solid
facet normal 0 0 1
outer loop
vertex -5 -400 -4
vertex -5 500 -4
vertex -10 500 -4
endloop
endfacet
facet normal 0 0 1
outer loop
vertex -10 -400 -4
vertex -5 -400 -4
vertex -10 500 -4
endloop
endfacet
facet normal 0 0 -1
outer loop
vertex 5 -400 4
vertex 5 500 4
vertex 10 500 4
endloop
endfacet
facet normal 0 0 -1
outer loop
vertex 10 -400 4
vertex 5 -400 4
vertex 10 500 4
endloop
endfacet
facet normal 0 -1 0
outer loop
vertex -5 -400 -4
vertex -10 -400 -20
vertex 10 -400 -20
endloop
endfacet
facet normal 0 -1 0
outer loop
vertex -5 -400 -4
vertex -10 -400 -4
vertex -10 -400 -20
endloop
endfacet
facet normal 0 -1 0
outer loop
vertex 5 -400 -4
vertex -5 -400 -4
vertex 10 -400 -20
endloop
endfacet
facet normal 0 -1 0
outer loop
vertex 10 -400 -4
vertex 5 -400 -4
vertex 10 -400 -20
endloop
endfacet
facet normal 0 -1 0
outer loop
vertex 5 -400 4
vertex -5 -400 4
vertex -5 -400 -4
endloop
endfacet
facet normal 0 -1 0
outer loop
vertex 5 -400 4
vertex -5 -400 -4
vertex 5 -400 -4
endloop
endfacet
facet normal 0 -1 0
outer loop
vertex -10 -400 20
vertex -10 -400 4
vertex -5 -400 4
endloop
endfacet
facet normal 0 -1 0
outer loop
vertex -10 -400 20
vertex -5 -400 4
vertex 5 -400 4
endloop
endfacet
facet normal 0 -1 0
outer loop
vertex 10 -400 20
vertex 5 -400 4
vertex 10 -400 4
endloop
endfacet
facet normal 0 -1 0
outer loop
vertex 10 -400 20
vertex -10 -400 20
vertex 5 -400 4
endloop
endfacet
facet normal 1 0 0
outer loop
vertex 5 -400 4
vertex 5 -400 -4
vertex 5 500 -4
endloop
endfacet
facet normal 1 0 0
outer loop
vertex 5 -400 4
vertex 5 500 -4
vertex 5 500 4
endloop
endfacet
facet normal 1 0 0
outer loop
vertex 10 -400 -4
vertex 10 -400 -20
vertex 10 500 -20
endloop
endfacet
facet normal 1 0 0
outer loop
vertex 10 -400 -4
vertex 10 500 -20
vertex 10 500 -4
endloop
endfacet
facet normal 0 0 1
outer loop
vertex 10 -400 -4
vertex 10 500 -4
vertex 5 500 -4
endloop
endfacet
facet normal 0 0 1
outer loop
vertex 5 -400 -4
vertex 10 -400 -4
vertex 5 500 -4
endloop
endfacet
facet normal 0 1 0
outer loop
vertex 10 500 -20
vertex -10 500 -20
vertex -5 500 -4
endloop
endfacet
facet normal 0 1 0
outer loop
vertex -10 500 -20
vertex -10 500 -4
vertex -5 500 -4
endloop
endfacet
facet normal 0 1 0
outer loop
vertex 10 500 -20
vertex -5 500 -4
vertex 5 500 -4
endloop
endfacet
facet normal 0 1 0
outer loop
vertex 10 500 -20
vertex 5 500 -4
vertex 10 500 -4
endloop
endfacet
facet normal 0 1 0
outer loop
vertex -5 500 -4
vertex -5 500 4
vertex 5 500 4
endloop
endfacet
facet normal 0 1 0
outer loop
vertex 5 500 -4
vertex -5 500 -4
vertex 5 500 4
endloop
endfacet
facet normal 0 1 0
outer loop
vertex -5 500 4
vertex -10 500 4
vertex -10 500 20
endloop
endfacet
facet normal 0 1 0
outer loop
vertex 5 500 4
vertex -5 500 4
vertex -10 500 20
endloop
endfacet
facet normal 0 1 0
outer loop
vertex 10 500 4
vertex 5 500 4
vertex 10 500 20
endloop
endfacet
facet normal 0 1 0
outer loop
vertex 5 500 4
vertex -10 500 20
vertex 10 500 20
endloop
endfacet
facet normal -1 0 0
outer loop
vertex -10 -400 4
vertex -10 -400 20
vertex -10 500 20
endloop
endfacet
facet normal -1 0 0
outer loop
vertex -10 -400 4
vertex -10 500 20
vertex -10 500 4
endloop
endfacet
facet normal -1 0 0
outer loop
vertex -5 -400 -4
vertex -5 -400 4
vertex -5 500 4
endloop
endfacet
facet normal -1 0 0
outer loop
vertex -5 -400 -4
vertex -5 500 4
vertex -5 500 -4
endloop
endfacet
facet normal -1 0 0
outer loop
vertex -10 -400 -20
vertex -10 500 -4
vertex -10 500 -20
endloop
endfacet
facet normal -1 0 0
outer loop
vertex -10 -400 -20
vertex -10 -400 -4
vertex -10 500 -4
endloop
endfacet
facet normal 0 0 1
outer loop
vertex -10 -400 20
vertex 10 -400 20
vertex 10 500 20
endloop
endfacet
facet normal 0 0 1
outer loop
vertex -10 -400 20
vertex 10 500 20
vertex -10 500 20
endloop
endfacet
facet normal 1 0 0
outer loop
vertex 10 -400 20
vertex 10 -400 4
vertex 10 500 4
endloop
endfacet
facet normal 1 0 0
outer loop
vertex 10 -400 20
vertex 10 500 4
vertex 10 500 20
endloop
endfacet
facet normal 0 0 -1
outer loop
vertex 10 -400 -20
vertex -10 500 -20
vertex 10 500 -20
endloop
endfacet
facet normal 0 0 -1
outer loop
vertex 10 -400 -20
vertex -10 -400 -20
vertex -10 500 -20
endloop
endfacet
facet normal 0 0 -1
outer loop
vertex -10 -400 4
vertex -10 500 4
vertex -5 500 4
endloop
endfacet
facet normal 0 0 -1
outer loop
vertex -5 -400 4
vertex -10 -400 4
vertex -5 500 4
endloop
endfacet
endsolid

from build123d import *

# Parameters (mm, degrees)
F1_DEPTH      = 400
F1_DEPTH_BACK = 500


with BuildPart() as f1:
    # F0 (on Front) → F1 (new body, two sides)
    with BuildSketch(Plane.XZ) as f1_sk:
        Polygon((-10, -20), (10, -20), (10, -4), (5, -4), (5, 4), (10, 4), (10, 20), (-10, 20), (-10, 4), (-5, 4), (-5, -4), (-10, -4), align=None)
    extrude(amount=F1_DEPTH)
    extrude(f1_sk.sketch, amount=-F1_DEPTH_BACK)


solid = f1.part
